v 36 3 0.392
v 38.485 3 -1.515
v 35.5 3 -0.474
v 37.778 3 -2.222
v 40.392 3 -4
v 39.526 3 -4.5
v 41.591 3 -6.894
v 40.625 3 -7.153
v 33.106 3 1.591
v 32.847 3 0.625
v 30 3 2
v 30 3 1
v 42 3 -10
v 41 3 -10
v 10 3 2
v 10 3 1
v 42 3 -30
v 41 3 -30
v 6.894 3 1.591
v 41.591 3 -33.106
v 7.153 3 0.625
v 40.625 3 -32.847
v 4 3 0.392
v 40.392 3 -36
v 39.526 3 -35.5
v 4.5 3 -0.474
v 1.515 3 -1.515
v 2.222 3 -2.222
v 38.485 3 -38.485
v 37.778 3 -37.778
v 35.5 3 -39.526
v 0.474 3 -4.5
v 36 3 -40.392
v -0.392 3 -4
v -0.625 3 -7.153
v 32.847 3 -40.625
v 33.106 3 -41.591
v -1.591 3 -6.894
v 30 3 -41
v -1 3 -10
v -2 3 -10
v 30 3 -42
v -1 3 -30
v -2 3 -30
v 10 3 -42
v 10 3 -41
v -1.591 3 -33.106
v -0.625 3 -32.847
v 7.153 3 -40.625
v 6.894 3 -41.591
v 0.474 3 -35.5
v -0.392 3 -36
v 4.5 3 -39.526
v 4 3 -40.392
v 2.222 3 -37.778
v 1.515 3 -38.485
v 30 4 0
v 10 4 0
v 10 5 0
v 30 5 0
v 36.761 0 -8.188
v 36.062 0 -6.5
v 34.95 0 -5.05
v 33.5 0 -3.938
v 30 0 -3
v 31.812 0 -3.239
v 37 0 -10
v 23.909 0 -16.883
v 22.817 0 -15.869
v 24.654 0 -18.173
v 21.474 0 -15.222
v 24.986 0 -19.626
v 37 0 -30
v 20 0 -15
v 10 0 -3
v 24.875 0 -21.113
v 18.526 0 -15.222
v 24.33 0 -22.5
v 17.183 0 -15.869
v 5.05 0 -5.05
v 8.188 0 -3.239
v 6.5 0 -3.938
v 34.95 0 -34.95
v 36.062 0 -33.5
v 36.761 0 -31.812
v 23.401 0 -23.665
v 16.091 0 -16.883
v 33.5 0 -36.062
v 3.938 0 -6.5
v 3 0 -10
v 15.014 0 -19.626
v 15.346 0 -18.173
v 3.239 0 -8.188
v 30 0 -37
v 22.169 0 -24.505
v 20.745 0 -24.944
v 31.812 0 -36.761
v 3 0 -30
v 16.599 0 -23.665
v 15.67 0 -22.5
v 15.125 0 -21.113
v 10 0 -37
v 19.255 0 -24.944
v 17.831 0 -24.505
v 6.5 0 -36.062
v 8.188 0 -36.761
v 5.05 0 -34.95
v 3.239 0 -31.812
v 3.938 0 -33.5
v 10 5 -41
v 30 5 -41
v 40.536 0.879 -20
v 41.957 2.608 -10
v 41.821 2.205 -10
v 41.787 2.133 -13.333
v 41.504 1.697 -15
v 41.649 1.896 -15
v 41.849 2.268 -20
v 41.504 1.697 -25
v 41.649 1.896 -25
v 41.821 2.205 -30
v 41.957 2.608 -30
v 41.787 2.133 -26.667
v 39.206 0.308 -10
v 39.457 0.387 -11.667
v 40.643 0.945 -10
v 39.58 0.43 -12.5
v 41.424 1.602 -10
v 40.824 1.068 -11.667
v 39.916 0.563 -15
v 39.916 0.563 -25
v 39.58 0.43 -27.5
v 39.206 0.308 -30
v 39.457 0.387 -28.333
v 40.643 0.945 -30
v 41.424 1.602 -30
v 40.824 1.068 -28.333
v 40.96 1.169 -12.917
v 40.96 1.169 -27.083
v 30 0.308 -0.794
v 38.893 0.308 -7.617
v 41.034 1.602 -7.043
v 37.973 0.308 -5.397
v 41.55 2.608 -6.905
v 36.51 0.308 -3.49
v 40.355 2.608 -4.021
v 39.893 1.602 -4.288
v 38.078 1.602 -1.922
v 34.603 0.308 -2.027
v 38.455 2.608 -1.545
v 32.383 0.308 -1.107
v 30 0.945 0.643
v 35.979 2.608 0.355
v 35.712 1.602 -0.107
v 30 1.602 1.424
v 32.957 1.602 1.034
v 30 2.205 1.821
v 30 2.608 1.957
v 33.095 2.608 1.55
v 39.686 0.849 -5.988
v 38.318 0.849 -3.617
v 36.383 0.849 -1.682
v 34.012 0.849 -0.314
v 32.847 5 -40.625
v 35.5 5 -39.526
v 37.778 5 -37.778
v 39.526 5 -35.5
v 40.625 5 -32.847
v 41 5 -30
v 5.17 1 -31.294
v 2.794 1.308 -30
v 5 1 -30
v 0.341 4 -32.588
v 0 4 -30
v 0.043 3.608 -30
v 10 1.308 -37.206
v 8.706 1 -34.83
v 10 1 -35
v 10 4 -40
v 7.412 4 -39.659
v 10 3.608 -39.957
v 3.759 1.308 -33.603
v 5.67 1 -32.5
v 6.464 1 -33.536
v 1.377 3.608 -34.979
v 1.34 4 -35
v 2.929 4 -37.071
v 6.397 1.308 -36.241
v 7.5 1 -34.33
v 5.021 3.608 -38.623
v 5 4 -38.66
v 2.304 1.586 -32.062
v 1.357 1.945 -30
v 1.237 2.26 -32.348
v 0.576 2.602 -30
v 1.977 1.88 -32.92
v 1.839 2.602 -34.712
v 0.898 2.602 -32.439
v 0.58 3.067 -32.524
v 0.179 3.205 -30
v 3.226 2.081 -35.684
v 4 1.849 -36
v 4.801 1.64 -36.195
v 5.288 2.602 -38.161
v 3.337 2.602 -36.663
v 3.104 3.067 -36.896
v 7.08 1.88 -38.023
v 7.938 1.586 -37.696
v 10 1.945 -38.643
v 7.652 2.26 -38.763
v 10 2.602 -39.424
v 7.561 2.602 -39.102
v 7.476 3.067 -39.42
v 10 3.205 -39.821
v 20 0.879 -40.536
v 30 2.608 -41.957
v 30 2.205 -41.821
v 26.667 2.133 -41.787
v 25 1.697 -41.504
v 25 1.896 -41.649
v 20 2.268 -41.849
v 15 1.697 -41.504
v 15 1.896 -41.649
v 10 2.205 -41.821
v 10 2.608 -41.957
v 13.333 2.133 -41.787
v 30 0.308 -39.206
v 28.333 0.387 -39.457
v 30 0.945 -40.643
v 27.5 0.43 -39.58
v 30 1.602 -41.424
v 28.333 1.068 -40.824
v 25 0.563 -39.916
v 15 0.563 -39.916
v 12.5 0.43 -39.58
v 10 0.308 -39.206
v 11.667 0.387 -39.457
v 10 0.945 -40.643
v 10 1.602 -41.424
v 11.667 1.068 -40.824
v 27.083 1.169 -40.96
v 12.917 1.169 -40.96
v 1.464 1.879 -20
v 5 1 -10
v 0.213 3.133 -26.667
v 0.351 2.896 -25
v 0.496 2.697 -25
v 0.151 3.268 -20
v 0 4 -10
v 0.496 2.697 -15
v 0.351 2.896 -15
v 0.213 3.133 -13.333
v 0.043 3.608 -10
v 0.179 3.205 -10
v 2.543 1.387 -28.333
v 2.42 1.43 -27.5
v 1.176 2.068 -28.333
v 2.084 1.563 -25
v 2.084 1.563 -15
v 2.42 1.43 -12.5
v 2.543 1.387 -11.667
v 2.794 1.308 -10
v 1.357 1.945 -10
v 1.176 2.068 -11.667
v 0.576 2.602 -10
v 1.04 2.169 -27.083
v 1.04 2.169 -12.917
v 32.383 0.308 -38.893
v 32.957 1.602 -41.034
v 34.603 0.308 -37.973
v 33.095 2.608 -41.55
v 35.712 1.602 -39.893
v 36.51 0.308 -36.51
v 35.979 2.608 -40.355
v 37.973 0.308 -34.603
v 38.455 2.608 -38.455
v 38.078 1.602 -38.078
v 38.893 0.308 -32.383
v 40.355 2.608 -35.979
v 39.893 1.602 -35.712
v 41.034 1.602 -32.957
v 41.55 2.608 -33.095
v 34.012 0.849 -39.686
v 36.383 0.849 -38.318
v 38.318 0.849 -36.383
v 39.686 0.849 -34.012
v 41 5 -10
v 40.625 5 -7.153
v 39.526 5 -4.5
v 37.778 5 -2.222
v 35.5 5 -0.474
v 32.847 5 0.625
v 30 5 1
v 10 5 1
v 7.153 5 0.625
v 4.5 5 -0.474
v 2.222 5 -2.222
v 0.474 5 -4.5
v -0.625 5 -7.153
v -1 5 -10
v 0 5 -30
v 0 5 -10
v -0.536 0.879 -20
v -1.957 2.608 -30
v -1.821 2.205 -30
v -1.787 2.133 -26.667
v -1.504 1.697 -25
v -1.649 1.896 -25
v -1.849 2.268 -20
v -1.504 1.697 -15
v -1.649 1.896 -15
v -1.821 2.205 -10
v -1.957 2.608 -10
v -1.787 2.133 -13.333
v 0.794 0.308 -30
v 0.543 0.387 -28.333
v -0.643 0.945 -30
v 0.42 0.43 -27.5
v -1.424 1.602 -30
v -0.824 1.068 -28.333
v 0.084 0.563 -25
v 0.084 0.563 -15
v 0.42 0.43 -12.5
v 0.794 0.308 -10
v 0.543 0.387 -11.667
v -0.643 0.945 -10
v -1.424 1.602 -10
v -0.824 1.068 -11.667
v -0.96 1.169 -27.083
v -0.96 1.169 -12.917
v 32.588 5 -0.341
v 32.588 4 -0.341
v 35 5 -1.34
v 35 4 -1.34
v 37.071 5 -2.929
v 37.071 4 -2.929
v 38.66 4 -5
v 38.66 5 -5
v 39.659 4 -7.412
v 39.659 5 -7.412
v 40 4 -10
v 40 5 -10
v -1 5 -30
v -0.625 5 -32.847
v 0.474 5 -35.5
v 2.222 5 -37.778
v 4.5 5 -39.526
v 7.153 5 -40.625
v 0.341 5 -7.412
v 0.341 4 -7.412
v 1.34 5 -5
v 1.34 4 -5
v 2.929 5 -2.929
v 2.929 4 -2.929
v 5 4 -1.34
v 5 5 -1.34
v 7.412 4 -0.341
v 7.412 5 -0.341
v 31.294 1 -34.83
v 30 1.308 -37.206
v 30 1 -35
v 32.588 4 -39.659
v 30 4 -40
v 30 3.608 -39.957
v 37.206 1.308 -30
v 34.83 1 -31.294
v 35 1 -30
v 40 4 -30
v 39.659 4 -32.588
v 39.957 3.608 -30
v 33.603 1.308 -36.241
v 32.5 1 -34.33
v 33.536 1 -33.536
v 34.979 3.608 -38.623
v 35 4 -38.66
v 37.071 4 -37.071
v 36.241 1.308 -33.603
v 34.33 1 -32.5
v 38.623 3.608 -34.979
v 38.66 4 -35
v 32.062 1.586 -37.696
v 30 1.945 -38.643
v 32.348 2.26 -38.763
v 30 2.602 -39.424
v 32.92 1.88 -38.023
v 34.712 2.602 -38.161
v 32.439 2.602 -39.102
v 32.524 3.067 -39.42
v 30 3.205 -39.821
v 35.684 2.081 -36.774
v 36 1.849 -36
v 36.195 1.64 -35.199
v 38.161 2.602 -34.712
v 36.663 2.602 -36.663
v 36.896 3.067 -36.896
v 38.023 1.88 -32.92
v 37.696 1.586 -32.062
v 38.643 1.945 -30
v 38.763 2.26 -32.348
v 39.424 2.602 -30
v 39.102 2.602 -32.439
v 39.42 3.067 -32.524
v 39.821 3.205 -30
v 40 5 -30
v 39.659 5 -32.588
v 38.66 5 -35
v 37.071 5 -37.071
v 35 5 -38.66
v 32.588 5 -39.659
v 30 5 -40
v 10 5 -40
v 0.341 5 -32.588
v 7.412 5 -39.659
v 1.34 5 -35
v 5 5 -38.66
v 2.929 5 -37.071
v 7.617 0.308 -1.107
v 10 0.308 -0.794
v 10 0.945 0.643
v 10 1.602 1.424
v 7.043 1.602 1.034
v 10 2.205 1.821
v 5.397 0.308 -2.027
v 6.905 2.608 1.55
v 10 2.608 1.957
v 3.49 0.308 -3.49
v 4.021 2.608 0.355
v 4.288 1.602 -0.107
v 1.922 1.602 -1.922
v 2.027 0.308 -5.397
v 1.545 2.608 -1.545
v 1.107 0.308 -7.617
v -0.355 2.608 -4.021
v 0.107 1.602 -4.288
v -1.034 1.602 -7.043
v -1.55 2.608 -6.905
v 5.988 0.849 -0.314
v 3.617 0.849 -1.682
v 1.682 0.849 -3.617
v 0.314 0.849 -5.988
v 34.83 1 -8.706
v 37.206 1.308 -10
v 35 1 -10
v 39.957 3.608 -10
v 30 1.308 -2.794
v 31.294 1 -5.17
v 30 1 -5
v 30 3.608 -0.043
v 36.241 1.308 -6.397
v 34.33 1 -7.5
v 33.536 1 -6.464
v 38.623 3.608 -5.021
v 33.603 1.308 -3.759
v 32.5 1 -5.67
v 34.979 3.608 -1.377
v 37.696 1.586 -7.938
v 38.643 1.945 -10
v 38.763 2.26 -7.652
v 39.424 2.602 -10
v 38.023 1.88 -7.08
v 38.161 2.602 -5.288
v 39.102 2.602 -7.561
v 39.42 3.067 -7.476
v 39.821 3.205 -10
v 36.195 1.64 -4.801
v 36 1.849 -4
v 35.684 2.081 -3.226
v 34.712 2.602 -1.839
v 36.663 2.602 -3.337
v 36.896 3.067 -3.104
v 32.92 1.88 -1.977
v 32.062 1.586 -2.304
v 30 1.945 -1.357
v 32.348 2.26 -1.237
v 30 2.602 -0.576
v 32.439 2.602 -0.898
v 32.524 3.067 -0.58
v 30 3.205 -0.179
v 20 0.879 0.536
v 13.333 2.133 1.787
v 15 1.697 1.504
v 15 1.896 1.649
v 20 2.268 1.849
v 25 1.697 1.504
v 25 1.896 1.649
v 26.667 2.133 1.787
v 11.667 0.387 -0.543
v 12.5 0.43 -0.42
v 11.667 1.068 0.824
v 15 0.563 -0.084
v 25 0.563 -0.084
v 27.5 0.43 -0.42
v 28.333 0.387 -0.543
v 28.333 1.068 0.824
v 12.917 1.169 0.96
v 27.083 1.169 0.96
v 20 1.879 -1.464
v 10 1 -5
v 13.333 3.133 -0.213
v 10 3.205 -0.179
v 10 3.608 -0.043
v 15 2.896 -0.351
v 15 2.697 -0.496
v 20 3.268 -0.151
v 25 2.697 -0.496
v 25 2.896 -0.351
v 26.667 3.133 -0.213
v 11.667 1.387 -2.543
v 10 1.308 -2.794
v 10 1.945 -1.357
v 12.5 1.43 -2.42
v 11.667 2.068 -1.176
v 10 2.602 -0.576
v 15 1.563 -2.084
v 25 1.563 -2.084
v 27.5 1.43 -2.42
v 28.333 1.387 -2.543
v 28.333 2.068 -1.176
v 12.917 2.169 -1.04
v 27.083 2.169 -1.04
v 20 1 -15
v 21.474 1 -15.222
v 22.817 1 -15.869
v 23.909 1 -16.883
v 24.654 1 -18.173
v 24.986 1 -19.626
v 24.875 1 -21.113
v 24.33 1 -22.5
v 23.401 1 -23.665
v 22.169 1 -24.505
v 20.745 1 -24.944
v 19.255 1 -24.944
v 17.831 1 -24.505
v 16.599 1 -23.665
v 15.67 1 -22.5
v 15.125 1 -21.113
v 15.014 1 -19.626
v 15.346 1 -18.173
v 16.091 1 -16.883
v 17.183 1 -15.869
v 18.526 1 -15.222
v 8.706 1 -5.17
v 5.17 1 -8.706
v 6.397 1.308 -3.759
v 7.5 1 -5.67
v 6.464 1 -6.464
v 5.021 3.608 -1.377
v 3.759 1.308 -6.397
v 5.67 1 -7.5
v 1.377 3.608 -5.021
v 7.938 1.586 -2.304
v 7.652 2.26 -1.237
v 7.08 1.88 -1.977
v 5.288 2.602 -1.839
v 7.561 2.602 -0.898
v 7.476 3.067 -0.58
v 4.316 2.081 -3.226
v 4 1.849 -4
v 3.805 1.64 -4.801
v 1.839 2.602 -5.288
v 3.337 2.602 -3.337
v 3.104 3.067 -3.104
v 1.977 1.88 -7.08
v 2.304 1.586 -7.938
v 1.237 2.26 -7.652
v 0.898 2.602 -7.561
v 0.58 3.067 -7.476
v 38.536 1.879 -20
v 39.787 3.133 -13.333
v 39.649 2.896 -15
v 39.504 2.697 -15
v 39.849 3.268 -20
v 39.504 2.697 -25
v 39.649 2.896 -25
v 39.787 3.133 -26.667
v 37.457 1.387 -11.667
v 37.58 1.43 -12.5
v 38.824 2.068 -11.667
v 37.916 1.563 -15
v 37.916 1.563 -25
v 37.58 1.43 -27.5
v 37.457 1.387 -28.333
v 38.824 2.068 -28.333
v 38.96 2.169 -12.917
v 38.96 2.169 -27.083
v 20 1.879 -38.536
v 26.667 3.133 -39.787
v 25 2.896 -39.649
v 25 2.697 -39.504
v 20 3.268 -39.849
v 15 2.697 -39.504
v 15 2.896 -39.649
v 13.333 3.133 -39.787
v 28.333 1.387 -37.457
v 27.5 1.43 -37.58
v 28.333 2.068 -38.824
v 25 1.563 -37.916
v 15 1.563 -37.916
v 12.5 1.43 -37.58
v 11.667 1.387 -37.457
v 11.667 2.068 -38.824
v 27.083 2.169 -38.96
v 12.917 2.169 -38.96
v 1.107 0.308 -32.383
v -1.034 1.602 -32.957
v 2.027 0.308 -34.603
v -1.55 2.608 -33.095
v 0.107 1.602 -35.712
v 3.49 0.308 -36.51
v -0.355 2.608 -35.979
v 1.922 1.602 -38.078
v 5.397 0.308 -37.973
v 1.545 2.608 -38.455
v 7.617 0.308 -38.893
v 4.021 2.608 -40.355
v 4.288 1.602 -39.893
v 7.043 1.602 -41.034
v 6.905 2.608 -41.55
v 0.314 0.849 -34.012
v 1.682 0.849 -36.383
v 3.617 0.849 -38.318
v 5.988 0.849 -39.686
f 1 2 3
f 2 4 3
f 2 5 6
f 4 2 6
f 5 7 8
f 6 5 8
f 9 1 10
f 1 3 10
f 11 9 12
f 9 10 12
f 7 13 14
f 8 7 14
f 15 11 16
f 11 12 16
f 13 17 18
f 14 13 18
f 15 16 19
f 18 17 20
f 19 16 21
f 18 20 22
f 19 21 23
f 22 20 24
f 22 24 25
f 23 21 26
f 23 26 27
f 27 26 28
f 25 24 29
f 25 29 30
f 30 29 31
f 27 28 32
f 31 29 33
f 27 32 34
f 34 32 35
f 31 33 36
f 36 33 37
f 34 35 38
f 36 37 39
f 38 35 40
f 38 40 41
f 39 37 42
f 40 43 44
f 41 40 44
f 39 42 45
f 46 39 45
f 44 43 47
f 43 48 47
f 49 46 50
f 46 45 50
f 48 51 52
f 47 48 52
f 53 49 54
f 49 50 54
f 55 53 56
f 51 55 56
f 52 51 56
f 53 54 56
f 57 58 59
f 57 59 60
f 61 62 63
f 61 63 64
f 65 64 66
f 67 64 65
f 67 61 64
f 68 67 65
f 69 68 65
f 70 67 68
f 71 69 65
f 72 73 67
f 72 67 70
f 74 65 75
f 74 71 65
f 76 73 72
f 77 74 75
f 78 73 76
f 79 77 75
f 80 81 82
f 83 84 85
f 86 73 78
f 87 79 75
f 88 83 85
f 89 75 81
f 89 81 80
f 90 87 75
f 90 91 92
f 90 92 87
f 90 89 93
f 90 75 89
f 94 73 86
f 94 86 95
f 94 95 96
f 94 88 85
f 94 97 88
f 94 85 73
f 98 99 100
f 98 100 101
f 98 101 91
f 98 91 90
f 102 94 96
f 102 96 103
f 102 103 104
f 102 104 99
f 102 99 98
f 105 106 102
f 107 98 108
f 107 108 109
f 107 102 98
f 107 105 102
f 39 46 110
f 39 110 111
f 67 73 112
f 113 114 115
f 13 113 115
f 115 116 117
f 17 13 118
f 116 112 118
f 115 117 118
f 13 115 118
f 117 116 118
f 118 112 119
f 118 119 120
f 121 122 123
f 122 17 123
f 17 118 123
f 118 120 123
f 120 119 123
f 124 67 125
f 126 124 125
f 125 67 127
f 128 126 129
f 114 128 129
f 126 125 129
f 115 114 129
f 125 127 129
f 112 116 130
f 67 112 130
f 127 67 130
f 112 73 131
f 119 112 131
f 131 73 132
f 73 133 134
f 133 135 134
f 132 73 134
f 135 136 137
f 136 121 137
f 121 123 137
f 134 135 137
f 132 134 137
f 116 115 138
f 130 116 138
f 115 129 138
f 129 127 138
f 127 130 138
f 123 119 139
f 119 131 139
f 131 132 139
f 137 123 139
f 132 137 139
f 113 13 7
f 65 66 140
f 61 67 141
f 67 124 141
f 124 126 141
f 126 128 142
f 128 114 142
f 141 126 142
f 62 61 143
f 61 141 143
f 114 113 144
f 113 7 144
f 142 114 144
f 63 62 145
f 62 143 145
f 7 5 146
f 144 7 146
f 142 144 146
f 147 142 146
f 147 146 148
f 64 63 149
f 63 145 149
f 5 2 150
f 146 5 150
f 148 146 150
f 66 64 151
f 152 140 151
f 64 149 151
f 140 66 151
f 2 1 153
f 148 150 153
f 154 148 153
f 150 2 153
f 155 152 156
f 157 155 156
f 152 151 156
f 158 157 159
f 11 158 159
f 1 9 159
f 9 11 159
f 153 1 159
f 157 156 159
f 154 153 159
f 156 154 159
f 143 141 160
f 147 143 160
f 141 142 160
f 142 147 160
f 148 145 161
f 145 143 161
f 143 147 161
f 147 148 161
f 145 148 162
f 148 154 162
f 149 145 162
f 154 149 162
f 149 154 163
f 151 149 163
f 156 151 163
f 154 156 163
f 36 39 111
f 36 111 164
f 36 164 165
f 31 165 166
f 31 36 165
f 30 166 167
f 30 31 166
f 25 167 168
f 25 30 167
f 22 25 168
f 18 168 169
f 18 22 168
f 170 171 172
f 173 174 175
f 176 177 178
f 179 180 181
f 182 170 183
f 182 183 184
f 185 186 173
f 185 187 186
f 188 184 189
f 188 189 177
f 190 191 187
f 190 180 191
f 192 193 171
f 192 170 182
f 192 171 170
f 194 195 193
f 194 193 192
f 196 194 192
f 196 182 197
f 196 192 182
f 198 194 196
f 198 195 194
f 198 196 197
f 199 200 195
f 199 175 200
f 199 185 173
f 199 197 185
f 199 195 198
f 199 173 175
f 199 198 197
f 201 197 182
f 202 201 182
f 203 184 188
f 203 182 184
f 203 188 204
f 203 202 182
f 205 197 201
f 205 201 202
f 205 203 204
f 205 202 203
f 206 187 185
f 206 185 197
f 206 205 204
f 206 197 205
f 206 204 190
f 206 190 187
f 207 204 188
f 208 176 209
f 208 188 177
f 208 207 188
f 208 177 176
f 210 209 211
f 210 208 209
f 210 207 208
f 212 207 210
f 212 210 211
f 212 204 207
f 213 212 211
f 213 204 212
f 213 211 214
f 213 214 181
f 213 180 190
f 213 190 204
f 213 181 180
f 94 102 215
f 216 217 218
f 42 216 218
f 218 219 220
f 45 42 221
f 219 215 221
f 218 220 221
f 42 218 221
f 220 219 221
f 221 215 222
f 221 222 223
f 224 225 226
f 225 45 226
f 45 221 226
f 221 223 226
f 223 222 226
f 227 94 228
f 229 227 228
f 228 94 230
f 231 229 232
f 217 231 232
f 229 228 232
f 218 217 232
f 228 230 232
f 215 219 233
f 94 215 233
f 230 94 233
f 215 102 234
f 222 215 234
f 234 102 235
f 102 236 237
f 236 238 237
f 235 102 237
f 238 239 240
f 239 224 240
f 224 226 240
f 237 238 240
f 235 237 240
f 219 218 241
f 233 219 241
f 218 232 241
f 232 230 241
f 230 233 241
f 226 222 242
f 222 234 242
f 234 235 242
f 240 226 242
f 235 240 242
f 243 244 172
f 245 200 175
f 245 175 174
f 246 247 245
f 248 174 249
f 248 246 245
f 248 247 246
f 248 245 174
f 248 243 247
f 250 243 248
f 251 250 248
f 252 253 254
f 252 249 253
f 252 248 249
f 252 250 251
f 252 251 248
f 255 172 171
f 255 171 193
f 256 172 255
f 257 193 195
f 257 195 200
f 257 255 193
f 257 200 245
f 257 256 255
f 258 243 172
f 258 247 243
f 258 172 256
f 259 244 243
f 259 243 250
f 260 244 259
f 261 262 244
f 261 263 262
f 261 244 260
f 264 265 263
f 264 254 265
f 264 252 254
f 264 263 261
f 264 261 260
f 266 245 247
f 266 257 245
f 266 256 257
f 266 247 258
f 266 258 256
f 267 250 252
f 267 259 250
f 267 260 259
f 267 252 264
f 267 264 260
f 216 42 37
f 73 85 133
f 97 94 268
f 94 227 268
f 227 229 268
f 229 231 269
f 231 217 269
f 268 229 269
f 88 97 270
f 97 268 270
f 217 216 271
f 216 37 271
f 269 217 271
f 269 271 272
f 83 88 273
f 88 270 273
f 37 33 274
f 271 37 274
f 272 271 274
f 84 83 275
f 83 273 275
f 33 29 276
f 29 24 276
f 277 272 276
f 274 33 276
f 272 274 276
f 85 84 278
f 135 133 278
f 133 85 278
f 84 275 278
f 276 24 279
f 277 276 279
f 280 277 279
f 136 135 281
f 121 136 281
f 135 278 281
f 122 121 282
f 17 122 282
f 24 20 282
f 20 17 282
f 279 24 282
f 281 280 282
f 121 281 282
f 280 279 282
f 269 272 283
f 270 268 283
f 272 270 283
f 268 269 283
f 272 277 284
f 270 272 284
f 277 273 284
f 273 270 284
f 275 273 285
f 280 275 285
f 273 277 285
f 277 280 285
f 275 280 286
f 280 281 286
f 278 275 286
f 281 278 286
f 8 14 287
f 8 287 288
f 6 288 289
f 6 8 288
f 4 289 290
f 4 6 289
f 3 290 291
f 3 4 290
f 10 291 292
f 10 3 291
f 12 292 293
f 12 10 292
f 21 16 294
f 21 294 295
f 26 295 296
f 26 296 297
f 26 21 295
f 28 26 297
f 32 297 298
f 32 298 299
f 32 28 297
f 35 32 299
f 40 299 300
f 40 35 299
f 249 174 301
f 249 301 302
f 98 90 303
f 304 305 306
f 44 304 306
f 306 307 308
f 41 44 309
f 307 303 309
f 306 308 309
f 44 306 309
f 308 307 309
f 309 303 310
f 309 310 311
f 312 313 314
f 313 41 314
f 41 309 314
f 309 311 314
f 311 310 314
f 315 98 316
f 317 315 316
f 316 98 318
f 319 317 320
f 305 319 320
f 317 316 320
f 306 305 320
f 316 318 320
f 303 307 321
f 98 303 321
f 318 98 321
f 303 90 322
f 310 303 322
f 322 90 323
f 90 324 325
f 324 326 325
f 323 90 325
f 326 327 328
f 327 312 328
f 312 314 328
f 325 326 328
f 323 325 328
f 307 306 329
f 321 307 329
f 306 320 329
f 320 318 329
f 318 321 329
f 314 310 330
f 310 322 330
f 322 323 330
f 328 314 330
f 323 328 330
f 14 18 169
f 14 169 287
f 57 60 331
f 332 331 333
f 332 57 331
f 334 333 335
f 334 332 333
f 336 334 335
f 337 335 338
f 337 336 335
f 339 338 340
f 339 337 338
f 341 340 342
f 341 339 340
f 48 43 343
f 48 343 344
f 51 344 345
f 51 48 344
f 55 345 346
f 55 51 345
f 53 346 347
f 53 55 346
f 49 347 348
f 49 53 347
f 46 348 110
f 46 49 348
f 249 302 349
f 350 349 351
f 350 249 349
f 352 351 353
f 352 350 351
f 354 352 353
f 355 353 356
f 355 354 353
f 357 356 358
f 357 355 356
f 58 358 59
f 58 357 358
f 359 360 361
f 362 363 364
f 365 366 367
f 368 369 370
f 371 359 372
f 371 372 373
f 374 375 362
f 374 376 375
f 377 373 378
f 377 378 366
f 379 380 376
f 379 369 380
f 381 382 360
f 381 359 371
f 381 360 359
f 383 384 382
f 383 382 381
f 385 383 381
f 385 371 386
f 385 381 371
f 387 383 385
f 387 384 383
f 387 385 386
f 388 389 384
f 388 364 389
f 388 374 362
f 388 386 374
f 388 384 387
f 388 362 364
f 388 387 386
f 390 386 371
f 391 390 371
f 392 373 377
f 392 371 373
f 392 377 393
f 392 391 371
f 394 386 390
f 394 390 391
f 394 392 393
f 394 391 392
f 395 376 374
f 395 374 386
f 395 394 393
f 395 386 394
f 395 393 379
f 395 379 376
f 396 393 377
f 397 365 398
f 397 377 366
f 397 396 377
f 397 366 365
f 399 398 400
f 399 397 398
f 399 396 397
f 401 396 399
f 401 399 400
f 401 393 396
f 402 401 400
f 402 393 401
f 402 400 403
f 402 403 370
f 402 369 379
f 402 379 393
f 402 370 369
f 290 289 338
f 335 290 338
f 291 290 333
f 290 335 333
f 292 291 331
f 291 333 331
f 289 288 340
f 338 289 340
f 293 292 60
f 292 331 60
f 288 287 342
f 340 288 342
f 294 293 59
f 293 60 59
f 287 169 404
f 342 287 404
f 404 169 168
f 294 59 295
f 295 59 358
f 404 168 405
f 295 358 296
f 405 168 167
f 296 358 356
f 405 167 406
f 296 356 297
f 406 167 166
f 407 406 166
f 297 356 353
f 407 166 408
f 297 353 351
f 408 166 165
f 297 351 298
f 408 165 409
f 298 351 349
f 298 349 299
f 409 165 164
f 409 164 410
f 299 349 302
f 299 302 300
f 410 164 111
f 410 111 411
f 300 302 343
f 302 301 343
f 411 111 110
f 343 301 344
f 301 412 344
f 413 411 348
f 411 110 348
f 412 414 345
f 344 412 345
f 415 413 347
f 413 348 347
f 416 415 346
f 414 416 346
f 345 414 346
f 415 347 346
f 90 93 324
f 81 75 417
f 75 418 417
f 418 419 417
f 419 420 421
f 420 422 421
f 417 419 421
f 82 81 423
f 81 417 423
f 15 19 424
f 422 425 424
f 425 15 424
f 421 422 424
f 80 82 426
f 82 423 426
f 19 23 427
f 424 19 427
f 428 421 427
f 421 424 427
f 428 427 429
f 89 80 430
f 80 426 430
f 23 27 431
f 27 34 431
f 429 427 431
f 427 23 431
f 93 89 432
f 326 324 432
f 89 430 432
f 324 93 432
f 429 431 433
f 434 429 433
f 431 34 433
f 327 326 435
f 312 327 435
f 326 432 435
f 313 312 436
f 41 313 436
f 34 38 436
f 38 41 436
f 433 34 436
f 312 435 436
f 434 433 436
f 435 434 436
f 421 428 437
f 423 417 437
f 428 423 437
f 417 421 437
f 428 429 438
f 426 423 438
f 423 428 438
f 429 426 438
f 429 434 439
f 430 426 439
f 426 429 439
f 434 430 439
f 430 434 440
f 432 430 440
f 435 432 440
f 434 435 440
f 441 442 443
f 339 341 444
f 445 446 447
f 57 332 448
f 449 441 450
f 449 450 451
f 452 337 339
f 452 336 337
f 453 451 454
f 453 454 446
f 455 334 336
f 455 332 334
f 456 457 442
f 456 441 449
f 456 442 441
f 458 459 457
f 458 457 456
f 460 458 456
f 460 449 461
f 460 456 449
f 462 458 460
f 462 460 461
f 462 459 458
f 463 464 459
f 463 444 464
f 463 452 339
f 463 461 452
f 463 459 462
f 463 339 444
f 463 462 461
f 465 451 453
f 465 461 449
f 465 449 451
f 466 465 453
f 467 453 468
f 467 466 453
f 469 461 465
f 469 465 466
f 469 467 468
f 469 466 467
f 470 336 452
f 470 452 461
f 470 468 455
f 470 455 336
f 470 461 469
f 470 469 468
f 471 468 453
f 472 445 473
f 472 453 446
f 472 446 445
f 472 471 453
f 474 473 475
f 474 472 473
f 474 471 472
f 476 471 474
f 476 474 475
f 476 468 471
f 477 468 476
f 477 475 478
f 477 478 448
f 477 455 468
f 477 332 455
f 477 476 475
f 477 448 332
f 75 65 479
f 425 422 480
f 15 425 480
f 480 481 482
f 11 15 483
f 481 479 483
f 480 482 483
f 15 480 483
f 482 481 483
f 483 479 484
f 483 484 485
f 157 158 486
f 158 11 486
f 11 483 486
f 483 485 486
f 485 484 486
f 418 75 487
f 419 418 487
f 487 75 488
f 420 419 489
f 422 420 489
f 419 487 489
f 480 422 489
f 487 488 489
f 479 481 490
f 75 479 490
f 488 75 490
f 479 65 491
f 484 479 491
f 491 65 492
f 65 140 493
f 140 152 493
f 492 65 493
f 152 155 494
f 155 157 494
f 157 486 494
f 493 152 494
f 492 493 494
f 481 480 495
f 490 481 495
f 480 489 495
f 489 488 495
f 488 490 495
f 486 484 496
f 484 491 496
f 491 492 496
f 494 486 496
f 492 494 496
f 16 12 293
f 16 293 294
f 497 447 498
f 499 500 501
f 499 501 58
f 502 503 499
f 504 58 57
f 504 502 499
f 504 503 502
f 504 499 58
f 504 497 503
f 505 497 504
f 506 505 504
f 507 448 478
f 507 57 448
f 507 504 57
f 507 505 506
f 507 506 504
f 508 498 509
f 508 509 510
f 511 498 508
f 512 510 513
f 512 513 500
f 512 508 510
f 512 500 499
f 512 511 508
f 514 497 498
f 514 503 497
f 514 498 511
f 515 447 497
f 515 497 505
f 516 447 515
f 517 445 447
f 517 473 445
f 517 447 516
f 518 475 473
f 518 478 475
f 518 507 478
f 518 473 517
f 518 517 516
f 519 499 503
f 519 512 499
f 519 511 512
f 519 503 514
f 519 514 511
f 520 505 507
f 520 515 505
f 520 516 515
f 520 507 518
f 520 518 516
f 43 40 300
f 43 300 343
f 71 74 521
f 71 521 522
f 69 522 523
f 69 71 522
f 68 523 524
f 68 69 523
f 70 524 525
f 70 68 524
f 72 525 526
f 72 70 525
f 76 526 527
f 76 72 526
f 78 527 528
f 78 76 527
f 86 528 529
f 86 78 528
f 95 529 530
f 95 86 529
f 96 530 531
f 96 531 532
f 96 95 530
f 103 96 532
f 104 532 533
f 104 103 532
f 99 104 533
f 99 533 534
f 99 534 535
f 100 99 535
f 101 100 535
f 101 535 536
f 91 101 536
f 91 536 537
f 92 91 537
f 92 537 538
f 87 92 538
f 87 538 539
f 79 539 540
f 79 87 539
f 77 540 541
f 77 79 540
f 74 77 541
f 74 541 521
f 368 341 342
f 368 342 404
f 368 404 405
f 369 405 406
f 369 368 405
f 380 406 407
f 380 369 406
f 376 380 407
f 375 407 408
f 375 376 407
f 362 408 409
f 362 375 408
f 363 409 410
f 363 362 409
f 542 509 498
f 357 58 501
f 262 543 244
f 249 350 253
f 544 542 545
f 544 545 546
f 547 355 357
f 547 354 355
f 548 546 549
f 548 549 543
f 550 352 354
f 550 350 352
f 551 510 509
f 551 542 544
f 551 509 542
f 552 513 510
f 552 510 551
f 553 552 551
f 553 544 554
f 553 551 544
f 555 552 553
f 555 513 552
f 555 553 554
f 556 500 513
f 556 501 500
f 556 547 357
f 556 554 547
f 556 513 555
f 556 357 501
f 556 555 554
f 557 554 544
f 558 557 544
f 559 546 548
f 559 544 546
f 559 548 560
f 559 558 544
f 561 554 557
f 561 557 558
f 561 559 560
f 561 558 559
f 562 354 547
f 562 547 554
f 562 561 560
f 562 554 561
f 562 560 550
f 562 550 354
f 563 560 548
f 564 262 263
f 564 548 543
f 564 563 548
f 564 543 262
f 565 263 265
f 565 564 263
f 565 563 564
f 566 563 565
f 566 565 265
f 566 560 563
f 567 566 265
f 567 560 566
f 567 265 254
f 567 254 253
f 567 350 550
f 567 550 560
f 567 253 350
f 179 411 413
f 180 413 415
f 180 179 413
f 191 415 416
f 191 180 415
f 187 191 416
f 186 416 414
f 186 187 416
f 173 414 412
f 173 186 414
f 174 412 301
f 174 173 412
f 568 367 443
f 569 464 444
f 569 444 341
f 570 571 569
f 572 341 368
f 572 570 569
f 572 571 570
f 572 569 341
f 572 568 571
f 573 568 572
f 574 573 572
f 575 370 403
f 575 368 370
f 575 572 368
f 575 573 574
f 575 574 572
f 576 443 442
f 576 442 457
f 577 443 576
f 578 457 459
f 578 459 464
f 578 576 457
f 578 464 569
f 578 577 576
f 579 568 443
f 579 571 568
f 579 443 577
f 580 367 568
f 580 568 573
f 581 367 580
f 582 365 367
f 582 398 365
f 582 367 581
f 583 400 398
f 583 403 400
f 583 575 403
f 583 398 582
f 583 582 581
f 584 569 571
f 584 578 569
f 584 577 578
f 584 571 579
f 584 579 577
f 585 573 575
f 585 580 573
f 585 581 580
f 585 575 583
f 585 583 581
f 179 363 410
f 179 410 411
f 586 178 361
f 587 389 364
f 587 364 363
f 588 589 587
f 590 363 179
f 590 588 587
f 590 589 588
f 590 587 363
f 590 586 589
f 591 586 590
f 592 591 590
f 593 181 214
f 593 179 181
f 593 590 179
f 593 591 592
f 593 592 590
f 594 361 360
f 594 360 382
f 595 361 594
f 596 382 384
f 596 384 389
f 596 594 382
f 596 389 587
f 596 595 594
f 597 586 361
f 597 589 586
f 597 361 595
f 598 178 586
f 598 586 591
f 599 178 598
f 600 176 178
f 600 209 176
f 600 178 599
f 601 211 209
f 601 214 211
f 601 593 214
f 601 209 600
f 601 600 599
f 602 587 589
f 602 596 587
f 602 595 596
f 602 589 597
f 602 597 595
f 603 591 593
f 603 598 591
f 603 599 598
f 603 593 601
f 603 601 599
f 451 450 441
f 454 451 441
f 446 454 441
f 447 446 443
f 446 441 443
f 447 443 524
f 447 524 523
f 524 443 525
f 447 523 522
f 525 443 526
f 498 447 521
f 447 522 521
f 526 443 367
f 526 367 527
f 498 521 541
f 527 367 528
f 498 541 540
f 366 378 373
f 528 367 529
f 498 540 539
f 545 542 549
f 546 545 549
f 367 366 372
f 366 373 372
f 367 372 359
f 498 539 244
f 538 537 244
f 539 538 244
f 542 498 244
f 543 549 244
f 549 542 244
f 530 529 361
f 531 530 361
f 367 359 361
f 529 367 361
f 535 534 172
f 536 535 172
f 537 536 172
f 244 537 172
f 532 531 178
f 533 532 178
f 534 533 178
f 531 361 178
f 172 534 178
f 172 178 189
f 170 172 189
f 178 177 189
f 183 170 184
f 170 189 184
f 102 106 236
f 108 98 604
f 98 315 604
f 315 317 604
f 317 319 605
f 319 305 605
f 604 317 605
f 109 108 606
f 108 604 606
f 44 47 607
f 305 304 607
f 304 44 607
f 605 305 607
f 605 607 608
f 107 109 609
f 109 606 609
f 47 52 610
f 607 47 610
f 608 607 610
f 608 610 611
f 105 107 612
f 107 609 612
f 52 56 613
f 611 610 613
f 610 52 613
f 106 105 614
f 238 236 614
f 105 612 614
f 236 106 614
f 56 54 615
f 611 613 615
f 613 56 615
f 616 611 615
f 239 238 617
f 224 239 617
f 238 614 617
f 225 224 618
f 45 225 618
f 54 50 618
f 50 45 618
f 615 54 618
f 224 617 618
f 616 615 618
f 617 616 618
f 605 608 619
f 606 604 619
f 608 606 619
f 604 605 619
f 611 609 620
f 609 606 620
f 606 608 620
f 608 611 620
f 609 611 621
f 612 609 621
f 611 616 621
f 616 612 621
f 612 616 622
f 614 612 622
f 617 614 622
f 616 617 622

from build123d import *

# Parameters (mm, degrees)
SKETCH1_R           = 5
BOSS_EXTRUDE2_DEPTH = 1
BOSS_EXTRUDE3_DEPTH = 5
BOSS_EXTRUDE4_DEPTH = 3
FILLET1_SIZE        = 5
FILLET1_SIZE_2      = 3
FILLET2_SIZE        = 5
FILLET2_SIZE_2      = 3


with BuildPart() as part:
    # Sketch1 → Boss-Extrude2 (new body)
    with BuildSketch(Plane(origin=(0, 0, 0), x_dir=(1, 0, 0), z_dir=(0, 1, 0))):
        with BuildLine():
            ThreePointArc((10, 0), (2.928932188, 2.928932188), (0, 10))
            Line((0, 10), (0, 30))
            ThreePointArc((0, 30), (2.928932188, 37.071067812), (10, 40))
            Line((10, 40), (30, 40))
            ThreePointArc((30, 40), (37.071067812, 37.071067812), (40, 30))
            Line((40, 30), (40, 10))
            ThreePointArc((40, 10), (37.071067812, 2.928932188), (30, 0))
            Line((30, 0), (10, 0))
        make_face()
        with Locations(Location((20, 20, 0), (0, 0, 270))):
            Circle(SKETCH1_R, mode=Mode.SUBTRACT)
    extrude(amount=BOSS_EXTRUDE2_DEPTH)

    # Sketch1<4> → Boss-Extrude3 (add)
    with BuildSketch(Plane(origin=(0, 0, 0), x_dir=(1, 0, 0), z_dir=(0, 1, 0))):
        with BuildLine():
            ThreePointArc((10, -1), (2.221825407, 2.221825407), (-1, 10))
            Line((-1, 10), (-1, 30))
            ThreePointArc((-1, 30), (2.221825407, 37.778174593), (10, 41))
            Line((10, 41), (30, 41))
            ThreePointArc((30, 41), (37.778174593, 37.778174593), (41, 30))
            Line((41, 30), (41, 10))
            ThreePointArc((41, 10), (37.778174593, 2.221825407), (30, -1))
            Line((30, -1), (10, -1))
        make_face()
        with BuildLine():
            Line((10, 0), (30, 0))
            ThreePointArc((30, 0), (37.071067812, 2.928932188), (40, 10))
            Line((40, 10), (40, 30))
            ThreePointArc((40, 30), (37.071067812, 37.071067812), (30, 40))
            Line((30, 40), (10, 40))
            ThreePointArc((10, 40), (2.928932188, 37.071067812), (0, 30))
            Line((0, 30), (0, 10))
            ThreePointArc((0, 10), (2.928932188, 2.928932188), (10, 0))
        make_face(mode=Mode.SUBTRACT)
    extrude(amount=BOSS_EXTRUDE3_DEPTH)

    # Sketch1<5> → Boss-Extrude4 (add)
    with BuildSketch(Plane(origin=(0, 0, 0), x_dir=(1, 0, 0), z_dir=(0, 1, 0))):
        with BuildLine():
            ThreePointArc((10, -2), (1.514718626, 1.514718626), (-2, 10))
            Line((-2, 10), (-2, 30))
            ThreePointArc((-2, 30), (1.514718626, 38.485281374), (10, 42))
            Line((10, 42), (30, 42))
            ThreePointArc((30, 42), (38.485281374, 38.485281374), (42, 30))
            Line((42, 30), (42, 10))
            ThreePointArc((42, 10), (38.485281374, 1.514718626), (30, -2))
            Line((30, -2), (10, -2))
        make_face()
        with BuildLine():
            Line((10, -1), (30, -1))
            ThreePointArc((30, -1), (37.778174593, 2.221825407), (41, 10))
            Line((41, 10), (41, 30))
            ThreePointArc((41, 30), (37.778174593, 37.778174593), (30, 41))
            Line((30, 41), (10, 41))
            ThreePointArc((10, 41), (2.221825407, 37.778174593), (-1, 30))
            Line((-1, 30), (-1, 10))
            ThreePointArc((-1, 10), (2.221825407, 2.221825407), (10, -1))
        make_face(mode=Mode.SUBTRACT)
    extrude(amount=BOSS_EXTRUDE4_DEPTH)

    # Fillet1
    # an asymmetric fillet: 5, 3 mm, written as the material it adds along each edge
    with BuildSketch(Plane(origin=(10, 1, -10), x_dir=(0, 0, 1), z_dir=(1, 0, 0))) as fillet1_piece_1:
        with BuildLine():
            Bezier((10 - FILLET1_SIZE, 0), (10, 0), (10, -FILLET1_SIZE_2), weights=[1, 0.707106781, 1])
            Line((10, -FILLET1_SIZE_2), (10, 0))
            Line((10, 0), (10 - FILLET1_SIZE, 0))
        make_face()
    revolve(axis=Axis((10, 1, -10), (0, -1, 0)), revolution_arc=90)
    with BuildSketch(Plane(origin=(30, 1, 0), x_dir=(0, 0, -1), z_dir=(-1, 0, 0)), Plane(origin=(40, 1, -30), x_dir=(-1, 0, 0), z_dir=(0, 0, 1)), Plane(origin=(10, 1, -40), x_dir=(0, 0, 1), z_dir=(1, 0, 0)), Plane(origin=(0, 1, -10), x_dir=(1, 0, 0), z_dir=(0, 0, -1))) as fillet1_piece_2:
        with BuildLine():
            Bezier((FILLET1_SIZE, 0), (0, 0), (0, -FILLET1_SIZE_2), weights=[1, 0.707106781, 1])
            Line((0, -FILLET1_SIZE_2), (0, 0))
            Line((0, 0), (FILLET1_SIZE, 0))
        make_face()
    extrude(amount=20)
    with BuildSketch(Plane(origin=(30, 1, -10), x_dir=(1, 0, 0), z_dir=(0, 0, -1))) as fillet1_piece_3:
        with BuildLine():
            Bezier((10 - FILLET1_SIZE, 0), (10, 0), (10, -FILLET1_SIZE_2), weights=[1, 0.707106781, 1])
            Line((10, -FILLET1_SIZE_2), (10, 0))
            Line((10, 0), (10 - FILLET1_SIZE, 0))
        make_face()
    revolve(axis=Axis((30, 1, -10), (0, -1, 0)), revolution_arc=90)
    with BuildSketch(Plane(origin=(30, 1, -30), x_dir=(0, 0, -1), z_dir=(-1, 0, 0))) as fillet1_piece_4:
        with BuildLine():
            Bezier((10 - FILLET1_SIZE, 0), (10, 0), (10, -FILLET1_SIZE_2), weights=[1, 0.707106781, 1])
            Line((10, -FILLET1_SIZE_2), (10, 0))
            Line((10, 0), (10 - FILLET1_SIZE, 0))
        make_face()
    revolve(axis=Axis((30, 1, -30), (0, -1, 0)), revolution_arc=90)
    with BuildSketch(Plane(origin=(10, 1, -30), x_dir=(-1, 0, 0), z_dir=(0, 0, 1))) as fillet1_piece_5:
        with BuildLine():
            Bezier((10 - FILLET1_SIZE, 0), (10, 0), (10, -FILLET1_SIZE_2), weights=[1, 0.707106781, 1])
            Line((10, -FILLET1_SIZE_2), (10, 0))
            Line((10, 0), (10 - FILLET1_SIZE, 0))
        make_face()
    revolve(axis=Axis((10, 1, -30), (0, -1, 0)), revolution_arc=90)

    # Fillet2
    # an asymmetric fillet: 5, 3 mm, written as the material it takes off along each edge
    with BuildSketch(Plane(origin=(10, 0, -42), x_dir=(0, 0, 1), z_dir=(1, 0, 0)), Plane(origin=(-2, 0, -10), x_dir=(1, 0, 0), z_dir=(0, 0, -1)), Plane(origin=(42, 0, -30), x_dir=(-1, 0, 0), z_dir=(0, 0, 1)), Plane(origin=(30, 0, 2), x_dir=(0, 0, -1), z_dir=(-1, 0, 0))) as fillet2_piece_1:
        with BuildLine():
            Bezier((FILLET2_SIZE, 0), (0, 0), (0, -FILLET2_SIZE_2), weights=[1, 0.707106781, 1])
            Line((0, -FILLET2_SIZE_2), (-0.1, -3))
            Line((-0.1, -3), (-0.1, 0.1))
            Line((-0.1, 0.1), (5, 0.1))
            Line((5, 0.1), (FILLET2_SIZE, 0))
        make_face()
    extrude(amount=20, mode=Mode.SUBTRACT)
    with BuildSketch(Plane(origin=(10, 0, -30), x_dir=(-1, 0, 0), z_dir=(0, 0, 1))) as fillet2_piece_2:
        with BuildLine():
            Bezier((12 - FILLET2_SIZE, 0), (12, 0), (12, -FILLET2_SIZE_2), weights=[1, 0.707106781, 1])
            Line((12, -FILLET2_SIZE_2), (12.1, -3))
            Line((12.1, -3), (12.1, 0.1))
            Line((12.1, 0.1), (7, 0.1))
            Line((7, 0.1), (12 - FILLET2_SIZE, 0))
        make_face()
    revolve(axis=Axis((10, 0, -30), (0, -1, 0)), revolution_arc=90, mode=Mode.SUBTRACT)
    with BuildSketch(Plane(origin=(30, 0, -30), x_dir=(0, 0, -1), z_dir=(-1, 0, 0))) as fillet2_piece_3:
        with BuildLine():
            Bezier((12 - FILLET2_SIZE, 0), (12, 0), (12, -FILLET2_SIZE_2), weights=[1, 0.707106781, 1])
            Line((12, -FILLET2_SIZE_2), (12.1, -3))
            Line((12.1, -3), (12.1, 0.1))
            Line((12.1, 0.1), (7, 0.1))
            Line((7, 0.1), (12 - FILLET2_SIZE, 0))
        make_face()
    revolve(axis=Axis((30, 0, -30), (0, -1, 0)), revolution_arc=90, mode=Mode.SUBTRACT)
    with BuildSketch(Plane(origin=(10, 0, -10), x_dir=(0, 0, 1), z_dir=(1, 0, 0))) as fillet2_piece_4:
        with BuildLine():
            Bezier((12 - FILLET2_SIZE, 0), (12, 0), (12, -FILLET2_SIZE_2), weights=[1, 0.707106781, 1])
            Line((12, -FILLET2_SIZE_2), (12.1, -3))
            Line((12.1, -3), (12.1, 0.1))
            Line((12.1, 0.1), (7, 0.1))
            Line((7, 0.1), (12 - FILLET2_SIZE, 0))
        make_face()
    revolve(axis=Axis((10, 0, -10), (0, -1, 0)), revolution_arc=90, mode=Mode.SUBTRACT)
    with BuildSketch(Plane(origin=(30, 0, -10), x_dir=(1, 0, 0), z_dir=(0, 0, -1))) as fillet2_piece_5:
        with BuildLine():
            Bezier((12 - FILLET2_SIZE, 0), (12, 0), (12, -FILLET2_SIZE_2), weights=[1, 0.707106781, 1])
            Line((12, -FILLET2_SIZE_2), (12.1, -3))
            Line((12.1, -3), (12.1, 0.1))
            Line((12.1, 0.1), (7, 0.1))
            Line((7, 0.1), (12 - FILLET2_SIZE, 0))
        make_face()
    revolve(axis=Axis((30, 0, -10), (0, -1, 0)), revolution_arc=90, mode=Mode.SUBTRACT)


solid = part.part
